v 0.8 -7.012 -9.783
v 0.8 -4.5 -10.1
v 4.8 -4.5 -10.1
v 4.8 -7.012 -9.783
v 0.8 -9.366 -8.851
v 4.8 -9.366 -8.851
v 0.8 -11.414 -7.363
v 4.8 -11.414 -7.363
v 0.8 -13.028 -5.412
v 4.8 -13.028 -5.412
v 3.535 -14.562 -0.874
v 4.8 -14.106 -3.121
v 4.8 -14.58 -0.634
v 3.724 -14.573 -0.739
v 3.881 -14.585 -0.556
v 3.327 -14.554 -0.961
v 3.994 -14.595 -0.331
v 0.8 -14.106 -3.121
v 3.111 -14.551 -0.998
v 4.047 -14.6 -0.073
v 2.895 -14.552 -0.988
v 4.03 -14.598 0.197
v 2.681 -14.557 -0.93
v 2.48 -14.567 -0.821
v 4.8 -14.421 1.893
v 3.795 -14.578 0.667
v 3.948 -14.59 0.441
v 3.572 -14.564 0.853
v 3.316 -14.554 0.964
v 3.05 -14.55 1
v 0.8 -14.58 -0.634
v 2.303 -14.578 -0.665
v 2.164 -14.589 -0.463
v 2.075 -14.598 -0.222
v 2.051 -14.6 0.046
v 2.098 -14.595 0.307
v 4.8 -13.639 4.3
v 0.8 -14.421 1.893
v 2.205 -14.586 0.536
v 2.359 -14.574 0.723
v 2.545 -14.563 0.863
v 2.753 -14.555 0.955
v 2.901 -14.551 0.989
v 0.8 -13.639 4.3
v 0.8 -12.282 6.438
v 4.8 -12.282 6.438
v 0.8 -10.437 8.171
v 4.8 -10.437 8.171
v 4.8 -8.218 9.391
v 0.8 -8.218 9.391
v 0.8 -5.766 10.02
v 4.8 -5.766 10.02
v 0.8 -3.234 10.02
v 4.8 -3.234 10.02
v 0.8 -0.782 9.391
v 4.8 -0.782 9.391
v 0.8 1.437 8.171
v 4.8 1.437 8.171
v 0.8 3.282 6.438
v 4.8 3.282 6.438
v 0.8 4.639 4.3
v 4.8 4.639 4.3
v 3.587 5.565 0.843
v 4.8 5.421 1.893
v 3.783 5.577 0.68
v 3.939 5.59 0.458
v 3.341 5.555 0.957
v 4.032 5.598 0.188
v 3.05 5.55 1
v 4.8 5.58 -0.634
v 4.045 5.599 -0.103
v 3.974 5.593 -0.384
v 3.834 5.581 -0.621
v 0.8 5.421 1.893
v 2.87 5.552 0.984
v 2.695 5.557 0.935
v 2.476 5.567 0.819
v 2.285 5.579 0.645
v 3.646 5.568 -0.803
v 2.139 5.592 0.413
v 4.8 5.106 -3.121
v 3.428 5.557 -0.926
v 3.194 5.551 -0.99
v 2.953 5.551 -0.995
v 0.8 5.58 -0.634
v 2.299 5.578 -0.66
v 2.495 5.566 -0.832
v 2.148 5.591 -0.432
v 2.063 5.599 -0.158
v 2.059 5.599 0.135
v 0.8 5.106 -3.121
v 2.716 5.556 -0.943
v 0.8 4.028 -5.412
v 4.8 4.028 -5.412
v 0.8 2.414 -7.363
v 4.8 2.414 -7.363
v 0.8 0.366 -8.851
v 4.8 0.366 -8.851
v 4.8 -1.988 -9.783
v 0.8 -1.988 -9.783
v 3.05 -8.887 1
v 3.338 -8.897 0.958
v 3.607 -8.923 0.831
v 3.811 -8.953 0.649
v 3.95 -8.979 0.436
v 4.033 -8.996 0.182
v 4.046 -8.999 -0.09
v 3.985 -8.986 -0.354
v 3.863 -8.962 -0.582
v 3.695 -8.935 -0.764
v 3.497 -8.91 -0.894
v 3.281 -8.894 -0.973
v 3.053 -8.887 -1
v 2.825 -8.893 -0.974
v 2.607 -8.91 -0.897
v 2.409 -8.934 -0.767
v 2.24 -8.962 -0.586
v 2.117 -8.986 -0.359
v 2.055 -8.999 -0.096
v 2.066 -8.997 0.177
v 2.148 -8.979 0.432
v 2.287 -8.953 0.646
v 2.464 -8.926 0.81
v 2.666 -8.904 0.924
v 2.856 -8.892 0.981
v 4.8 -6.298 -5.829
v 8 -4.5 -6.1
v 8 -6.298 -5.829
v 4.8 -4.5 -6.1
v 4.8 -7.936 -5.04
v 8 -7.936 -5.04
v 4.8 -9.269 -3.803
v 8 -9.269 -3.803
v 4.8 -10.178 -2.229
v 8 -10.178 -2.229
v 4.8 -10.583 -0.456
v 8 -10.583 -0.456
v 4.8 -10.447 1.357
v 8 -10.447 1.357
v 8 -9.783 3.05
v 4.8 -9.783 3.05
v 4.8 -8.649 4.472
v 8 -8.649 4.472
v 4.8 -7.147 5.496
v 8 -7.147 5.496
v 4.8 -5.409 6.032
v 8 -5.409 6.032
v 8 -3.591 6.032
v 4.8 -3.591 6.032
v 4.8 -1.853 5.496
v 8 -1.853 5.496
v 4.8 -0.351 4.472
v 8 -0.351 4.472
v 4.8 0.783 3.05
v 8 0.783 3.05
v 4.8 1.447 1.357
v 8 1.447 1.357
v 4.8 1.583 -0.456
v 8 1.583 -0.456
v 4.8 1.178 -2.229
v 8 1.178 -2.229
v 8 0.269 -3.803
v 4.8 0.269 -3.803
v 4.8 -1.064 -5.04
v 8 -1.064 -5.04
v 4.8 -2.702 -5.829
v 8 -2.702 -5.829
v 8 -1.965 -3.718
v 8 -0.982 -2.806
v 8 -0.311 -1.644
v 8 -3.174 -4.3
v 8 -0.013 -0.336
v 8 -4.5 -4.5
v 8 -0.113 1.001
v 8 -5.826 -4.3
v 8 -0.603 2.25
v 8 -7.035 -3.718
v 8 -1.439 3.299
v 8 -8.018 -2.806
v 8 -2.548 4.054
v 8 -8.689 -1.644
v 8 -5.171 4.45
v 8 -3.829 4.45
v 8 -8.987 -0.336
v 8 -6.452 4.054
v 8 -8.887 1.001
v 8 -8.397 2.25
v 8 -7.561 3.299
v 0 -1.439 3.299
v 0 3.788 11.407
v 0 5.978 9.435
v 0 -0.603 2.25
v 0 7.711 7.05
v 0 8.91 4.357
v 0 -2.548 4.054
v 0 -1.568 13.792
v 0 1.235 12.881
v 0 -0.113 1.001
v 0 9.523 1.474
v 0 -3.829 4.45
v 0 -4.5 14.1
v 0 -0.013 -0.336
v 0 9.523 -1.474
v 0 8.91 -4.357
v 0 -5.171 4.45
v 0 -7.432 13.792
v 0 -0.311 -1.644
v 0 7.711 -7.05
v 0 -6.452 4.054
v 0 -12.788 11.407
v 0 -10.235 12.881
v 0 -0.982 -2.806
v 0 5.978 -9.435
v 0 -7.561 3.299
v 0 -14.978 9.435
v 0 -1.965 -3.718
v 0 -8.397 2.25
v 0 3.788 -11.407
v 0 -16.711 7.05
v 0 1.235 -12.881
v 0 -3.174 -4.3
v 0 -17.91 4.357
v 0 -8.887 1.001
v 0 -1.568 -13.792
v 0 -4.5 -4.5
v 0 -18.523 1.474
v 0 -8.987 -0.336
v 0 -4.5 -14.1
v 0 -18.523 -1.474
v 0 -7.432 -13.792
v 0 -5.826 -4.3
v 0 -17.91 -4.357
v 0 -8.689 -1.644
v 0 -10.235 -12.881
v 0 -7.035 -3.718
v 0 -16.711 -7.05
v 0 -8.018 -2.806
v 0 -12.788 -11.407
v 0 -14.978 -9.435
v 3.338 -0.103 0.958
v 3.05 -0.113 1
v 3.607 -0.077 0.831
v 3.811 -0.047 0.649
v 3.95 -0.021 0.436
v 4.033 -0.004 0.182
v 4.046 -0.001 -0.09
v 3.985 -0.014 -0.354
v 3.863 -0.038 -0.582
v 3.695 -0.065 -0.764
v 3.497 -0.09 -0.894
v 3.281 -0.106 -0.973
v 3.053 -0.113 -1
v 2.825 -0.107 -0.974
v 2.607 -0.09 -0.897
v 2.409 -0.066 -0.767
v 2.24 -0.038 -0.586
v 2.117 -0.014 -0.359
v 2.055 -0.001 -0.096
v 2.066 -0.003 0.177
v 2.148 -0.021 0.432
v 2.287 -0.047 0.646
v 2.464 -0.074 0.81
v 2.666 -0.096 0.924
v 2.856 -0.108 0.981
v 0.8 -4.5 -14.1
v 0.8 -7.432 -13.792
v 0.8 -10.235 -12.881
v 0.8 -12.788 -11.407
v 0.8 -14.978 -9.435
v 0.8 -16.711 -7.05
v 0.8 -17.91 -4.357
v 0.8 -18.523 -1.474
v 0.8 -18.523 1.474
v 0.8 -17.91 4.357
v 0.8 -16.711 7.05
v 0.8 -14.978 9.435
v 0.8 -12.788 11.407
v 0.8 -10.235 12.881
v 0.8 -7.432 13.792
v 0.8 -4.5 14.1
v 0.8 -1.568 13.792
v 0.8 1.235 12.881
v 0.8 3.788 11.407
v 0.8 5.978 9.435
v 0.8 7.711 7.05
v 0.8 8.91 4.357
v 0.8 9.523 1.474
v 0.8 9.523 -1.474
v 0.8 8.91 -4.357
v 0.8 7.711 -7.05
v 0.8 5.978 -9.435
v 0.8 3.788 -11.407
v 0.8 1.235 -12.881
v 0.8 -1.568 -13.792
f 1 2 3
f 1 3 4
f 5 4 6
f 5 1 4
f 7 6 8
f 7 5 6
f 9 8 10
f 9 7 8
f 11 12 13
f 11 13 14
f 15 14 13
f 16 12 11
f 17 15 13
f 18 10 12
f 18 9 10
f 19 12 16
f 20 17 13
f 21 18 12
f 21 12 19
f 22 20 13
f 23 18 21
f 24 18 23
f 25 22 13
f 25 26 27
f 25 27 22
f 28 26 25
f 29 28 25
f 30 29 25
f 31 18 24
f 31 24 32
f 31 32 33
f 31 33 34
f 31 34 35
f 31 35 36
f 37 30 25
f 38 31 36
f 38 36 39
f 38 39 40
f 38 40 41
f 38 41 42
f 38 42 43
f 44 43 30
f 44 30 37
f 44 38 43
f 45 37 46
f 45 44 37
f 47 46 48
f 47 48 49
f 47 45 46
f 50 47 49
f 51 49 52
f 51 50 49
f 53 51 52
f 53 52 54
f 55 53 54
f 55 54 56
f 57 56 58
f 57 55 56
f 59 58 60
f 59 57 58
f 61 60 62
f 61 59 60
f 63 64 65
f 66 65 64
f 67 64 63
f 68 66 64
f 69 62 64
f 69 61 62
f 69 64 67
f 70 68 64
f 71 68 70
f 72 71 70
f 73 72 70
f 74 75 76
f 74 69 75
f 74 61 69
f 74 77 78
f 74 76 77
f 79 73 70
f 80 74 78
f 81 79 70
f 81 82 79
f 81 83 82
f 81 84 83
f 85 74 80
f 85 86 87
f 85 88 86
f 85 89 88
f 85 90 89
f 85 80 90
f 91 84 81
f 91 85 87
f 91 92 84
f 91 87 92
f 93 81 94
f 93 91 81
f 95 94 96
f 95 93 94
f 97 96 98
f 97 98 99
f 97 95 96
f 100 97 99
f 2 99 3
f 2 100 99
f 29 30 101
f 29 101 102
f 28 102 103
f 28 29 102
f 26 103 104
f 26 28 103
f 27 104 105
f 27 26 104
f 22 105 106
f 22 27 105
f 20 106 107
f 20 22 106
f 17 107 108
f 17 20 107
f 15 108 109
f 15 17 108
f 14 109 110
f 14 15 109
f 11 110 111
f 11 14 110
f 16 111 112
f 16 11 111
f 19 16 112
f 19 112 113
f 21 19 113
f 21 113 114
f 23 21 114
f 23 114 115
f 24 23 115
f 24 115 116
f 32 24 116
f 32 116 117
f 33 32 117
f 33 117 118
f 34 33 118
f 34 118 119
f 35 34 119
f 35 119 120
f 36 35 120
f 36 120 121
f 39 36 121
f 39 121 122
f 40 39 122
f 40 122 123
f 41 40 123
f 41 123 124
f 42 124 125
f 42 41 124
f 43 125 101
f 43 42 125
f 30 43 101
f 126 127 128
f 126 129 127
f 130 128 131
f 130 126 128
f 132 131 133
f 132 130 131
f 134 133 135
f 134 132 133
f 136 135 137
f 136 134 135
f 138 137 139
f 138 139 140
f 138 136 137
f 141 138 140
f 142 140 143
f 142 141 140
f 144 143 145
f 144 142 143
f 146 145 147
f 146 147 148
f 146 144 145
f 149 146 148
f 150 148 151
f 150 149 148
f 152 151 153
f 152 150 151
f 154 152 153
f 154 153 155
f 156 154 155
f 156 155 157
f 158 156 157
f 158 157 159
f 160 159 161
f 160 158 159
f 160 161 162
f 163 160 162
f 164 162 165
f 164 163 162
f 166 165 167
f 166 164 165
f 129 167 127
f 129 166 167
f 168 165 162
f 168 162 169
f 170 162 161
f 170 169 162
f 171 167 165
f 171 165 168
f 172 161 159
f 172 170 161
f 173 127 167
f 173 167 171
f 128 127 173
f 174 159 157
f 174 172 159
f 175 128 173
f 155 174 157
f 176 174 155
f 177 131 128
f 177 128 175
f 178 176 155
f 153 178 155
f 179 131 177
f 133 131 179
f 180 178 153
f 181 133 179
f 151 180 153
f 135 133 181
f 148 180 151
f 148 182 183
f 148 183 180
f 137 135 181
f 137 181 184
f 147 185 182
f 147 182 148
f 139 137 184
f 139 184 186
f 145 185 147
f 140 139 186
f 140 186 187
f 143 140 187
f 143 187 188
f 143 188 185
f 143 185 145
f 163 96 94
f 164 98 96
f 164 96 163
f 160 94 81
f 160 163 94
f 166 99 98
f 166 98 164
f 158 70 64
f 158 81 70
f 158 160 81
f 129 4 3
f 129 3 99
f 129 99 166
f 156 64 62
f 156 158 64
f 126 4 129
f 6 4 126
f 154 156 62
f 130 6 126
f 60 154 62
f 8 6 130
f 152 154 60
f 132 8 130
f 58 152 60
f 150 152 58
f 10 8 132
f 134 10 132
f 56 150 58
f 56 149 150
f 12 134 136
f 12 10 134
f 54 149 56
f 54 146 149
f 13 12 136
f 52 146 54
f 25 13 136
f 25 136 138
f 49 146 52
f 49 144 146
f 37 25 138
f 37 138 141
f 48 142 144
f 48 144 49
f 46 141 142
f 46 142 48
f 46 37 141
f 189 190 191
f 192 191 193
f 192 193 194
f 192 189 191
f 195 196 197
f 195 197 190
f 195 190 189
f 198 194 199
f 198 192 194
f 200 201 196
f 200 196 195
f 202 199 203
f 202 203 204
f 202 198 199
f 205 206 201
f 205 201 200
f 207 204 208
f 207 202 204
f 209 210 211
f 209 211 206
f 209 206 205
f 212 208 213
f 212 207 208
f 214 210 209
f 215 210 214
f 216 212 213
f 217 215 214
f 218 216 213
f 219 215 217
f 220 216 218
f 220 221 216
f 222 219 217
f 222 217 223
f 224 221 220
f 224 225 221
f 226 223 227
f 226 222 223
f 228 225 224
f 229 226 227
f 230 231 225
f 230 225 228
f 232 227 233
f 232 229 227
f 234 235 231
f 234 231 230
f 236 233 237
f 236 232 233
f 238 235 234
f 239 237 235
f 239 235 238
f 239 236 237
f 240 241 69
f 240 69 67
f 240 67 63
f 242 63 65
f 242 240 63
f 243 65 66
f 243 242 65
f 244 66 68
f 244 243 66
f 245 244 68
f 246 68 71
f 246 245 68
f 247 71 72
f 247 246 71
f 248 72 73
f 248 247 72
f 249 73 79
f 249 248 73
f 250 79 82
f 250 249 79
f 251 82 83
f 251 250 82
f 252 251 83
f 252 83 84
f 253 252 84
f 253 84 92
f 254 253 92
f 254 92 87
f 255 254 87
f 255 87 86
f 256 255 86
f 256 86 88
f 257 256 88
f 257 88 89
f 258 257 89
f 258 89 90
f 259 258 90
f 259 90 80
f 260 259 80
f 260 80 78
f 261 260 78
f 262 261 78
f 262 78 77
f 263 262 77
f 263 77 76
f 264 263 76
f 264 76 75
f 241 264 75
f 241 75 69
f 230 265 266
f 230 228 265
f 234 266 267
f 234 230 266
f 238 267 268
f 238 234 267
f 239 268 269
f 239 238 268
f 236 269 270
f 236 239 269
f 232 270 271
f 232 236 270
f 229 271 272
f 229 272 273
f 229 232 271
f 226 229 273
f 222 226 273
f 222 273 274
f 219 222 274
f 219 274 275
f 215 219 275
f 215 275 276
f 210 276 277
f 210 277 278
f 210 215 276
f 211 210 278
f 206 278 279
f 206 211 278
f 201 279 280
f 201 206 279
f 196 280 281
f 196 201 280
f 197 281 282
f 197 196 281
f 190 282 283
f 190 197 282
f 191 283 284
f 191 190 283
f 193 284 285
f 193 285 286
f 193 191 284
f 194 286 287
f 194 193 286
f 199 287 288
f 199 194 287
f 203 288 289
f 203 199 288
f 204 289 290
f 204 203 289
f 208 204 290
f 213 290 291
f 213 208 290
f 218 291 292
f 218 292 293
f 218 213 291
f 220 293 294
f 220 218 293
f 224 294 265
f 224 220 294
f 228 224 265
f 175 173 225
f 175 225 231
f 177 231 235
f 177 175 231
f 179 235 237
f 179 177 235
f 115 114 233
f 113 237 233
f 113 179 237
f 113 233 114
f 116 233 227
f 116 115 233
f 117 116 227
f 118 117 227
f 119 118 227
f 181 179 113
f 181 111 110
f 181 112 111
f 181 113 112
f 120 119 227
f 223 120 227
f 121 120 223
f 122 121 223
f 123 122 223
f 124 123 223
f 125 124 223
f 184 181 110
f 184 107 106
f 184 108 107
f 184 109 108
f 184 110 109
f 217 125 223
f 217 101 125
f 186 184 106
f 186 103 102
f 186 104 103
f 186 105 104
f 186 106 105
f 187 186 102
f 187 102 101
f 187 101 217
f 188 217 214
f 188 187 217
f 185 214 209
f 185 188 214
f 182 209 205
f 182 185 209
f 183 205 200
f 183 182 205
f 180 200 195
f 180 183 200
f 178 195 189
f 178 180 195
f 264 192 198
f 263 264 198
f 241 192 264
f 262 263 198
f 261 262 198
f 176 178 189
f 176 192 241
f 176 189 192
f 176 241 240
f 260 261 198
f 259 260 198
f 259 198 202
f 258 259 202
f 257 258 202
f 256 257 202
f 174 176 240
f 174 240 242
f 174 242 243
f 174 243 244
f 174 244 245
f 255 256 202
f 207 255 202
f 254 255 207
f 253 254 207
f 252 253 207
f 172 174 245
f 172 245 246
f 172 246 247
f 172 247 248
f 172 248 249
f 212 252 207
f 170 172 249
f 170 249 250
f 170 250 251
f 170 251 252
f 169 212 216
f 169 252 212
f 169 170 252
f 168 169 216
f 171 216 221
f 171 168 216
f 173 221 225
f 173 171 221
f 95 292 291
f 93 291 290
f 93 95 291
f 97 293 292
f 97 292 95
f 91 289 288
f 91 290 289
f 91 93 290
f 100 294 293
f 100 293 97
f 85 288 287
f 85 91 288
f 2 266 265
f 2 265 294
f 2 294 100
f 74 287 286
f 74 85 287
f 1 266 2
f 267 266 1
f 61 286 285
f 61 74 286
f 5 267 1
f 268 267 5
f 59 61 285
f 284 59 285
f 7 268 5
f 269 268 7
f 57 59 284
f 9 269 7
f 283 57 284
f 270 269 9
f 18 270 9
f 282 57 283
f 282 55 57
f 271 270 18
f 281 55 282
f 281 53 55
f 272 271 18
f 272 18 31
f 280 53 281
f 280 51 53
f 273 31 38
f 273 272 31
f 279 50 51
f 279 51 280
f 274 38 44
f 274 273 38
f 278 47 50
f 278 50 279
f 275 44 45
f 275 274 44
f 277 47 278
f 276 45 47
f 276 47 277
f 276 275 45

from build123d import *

# Parameters (mm, degrees)
CUT_EXTRUDE1_DEPTH      = 22.485343842
CUT_EXTRUDE1_DEPTH_BACK = 22.485343842
SKETCH4_R               = 1


with BuildPart() as part:
    # Sketch1 → Revolve1 (revolve)
    with BuildSketch(Plane.XY, mode=Mode.PRIVATE) as revolve1_sk:
        Polygon((0, 0), (8, 0), (8, 1.6), (4.8, 1.6), (4.8, 5.6), (0.8, 5.6), (0.8, 9.6), (0, 9.6), align=None)
    revolve(revolve1_sk.sketch.rotate(Axis((124.631559107, -4.5, 0), (-1, 0, 0)), 90), axis=Axis((124.631559107, -4.5, 0), (-1, 0, 0)))

    # Sketch4 → Cut-Extrude1 (cut, two sides: drawn at the far end of the back side and taken through both)
    with BuildSketch(Plane(origin=(0, -4.5, 0), x_dir=(1, 0, 0), z_dir=(0, 1, 0)).offset(-CUT_EXTRUDE1_DEPTH_BACK)):
        with Locations(Location((3.05, 0, 0), (0, 0, 270))):
            Circle(SKETCH4_R)
    extrude(amount=CUT_EXTRUDE1_DEPTH + CUT_EXTRUDE1_DEPTH_BACK, mode=Mode.SUBTRACT)


solid = part.part
